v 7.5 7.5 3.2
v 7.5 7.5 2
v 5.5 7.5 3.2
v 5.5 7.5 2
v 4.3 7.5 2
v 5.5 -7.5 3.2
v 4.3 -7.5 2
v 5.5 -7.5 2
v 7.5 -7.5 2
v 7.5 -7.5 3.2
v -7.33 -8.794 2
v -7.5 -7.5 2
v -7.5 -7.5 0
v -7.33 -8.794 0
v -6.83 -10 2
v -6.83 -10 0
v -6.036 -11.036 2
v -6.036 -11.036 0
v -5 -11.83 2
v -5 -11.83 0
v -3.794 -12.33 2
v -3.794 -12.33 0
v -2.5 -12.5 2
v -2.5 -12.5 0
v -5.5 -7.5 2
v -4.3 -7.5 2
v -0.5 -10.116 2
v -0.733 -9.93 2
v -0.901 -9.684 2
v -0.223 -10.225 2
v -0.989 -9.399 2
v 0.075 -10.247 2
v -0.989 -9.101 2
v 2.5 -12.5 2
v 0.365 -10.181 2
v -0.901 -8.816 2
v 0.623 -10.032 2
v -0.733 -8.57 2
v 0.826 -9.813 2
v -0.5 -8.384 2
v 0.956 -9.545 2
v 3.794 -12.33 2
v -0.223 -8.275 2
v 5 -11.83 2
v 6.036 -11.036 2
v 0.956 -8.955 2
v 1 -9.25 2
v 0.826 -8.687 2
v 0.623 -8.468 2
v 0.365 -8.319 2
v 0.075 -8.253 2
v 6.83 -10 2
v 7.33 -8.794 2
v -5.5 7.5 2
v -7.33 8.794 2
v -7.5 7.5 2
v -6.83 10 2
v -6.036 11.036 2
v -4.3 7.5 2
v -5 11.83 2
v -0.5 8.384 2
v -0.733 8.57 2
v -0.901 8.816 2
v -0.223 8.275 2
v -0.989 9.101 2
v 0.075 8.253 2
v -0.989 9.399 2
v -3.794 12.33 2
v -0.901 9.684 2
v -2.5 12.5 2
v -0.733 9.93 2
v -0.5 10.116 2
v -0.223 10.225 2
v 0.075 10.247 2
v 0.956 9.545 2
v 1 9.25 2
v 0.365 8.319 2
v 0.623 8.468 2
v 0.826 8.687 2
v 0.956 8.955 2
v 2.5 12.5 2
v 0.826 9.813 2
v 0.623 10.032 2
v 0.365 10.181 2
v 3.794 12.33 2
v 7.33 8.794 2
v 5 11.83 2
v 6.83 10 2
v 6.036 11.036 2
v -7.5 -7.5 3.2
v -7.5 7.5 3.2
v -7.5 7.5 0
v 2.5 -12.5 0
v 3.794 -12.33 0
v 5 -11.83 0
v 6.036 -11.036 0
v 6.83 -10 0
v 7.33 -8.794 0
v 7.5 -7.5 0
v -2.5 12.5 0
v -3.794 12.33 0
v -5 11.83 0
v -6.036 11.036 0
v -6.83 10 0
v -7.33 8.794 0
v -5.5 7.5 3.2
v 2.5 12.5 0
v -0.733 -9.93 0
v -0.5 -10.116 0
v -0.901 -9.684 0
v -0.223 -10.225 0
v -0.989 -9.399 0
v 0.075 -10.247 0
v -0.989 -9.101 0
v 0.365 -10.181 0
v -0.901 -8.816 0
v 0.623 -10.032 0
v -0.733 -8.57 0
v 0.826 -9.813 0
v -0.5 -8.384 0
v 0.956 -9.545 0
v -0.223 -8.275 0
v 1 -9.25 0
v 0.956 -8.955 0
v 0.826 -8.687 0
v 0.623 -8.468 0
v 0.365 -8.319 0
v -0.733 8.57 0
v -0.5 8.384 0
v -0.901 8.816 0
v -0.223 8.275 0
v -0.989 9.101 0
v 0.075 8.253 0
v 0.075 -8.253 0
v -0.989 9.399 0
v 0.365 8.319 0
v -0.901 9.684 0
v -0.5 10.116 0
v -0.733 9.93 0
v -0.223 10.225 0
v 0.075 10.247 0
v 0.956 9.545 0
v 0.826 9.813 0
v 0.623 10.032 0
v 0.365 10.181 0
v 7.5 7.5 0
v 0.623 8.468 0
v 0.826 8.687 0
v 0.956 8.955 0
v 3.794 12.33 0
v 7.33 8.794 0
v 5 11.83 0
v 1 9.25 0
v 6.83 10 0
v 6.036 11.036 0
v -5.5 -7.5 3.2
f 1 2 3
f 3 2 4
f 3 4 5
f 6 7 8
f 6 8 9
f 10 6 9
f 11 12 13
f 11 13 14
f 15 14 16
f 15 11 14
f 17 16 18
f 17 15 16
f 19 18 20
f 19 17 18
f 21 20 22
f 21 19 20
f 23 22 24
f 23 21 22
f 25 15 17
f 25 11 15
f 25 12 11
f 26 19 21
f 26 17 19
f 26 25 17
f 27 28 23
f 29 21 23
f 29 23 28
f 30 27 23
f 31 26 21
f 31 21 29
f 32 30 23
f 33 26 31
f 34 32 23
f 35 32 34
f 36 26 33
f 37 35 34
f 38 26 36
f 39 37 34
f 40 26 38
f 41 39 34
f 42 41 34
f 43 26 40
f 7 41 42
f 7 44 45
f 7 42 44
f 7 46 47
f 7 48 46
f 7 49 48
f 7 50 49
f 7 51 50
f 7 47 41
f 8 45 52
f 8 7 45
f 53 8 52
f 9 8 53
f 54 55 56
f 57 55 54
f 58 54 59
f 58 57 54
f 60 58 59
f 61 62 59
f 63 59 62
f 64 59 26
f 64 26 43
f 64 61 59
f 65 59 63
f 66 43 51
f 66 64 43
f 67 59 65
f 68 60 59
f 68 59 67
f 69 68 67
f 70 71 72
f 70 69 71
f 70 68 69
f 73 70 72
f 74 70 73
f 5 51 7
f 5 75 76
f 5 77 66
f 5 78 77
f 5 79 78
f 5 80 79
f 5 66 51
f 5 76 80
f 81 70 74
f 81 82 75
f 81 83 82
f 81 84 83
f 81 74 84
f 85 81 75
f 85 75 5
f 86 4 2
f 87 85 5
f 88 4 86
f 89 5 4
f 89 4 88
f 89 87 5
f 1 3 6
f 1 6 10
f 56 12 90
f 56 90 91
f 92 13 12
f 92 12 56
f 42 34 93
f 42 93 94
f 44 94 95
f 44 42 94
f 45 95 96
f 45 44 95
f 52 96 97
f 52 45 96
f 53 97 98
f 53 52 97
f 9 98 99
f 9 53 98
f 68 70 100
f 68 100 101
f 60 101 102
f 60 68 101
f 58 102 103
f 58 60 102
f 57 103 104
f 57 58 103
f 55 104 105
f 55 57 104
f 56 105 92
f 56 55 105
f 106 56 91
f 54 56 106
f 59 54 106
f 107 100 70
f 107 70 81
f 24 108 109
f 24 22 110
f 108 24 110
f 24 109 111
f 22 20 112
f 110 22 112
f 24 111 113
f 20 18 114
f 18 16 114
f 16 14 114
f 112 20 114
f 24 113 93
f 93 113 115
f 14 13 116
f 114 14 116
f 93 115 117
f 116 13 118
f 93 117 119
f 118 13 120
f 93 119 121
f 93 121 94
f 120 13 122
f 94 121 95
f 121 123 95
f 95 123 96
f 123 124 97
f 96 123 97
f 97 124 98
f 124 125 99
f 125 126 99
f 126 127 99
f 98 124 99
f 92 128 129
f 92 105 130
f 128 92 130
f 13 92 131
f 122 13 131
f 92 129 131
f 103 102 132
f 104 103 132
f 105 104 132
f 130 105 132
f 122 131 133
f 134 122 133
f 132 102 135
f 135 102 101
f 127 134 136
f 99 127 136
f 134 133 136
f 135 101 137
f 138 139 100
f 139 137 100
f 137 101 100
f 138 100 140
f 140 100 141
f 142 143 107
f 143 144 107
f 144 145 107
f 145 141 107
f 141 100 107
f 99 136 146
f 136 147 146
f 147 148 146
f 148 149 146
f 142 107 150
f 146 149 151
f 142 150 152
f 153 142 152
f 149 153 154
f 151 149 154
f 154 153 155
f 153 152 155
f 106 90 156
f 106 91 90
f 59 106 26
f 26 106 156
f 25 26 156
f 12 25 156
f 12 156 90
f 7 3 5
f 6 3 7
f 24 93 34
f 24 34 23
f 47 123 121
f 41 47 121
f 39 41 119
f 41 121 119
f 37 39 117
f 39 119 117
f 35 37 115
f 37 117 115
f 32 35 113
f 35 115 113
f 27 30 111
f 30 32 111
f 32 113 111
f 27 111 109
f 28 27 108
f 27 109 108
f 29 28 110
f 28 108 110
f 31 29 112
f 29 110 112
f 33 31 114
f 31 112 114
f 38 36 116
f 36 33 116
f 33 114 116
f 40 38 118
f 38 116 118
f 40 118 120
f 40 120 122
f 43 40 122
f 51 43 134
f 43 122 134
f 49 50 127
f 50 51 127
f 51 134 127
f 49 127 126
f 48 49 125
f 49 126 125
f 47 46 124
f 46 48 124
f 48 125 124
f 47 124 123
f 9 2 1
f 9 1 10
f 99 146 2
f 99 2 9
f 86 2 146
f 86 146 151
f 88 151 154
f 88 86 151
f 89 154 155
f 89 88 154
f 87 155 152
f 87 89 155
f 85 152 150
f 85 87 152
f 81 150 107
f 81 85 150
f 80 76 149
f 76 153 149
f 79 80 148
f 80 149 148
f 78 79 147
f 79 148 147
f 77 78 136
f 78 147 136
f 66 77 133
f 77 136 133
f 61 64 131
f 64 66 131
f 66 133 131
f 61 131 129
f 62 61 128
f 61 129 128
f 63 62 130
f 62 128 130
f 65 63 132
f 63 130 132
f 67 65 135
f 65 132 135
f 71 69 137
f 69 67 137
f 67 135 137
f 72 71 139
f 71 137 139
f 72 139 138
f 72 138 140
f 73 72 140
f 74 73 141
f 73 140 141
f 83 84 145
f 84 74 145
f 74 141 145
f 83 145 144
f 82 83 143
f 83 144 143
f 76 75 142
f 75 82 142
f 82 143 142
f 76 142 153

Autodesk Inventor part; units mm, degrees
ref_plane "YZ Plane" through (0, 0, 0) normal (1, 0, 0) x (0, 1, 0)
ref_plane "XZ Plane" through (0, 0, 0) normal (0, 1, 0) x (-1, 0, 0)
ref_plane "XY Plane" through (0, 0, 0) normal (0, 0, 1) x (1, 0, 0)
sketch "Эскиз1" plane through (0, 0, 0) normal (0, 0, 1) x (1, 0, 0)
  circle A0 centre (0, 0) radius 6
  line L0 (-7.5, 12.5) -> (7.5, 12.5)
  line L1 (7.5, 12.5) -> (7.5, -12.5)
  line L2 (7.5, -12.5) -> (-7.5, -12.5)
  line L3 (-7.5, -12.5) -> (-7.5, 12.5)
  line L4 (-7.5, 12.5) -> (7.5, -12.5) construction
  line L5 (7.5, 12.5) -> (-7.5, -12.5) construction
  line L6 (0, 6) -> (0, 12.5)
  line L7 (0, -6) -> (0, -12.5)
  circle A1 centre (0, 9.25) radius 1
  circle A2 centre (0, -9.25) radius 1
  dimension "d0" = 12
  dimension "d1" = 15
  dimension "d2" = 25
  dimension "d31" = 2
  dimension "d32" = 2
extrude "Выдавливание1" add sketch "Эскиз1" along normal blind 2 contours A0 | A0 L6 A1 L0 L1 L2 L7 A2 | A0 L7 A2 L2 L3 L0 L6 A1
fillet "Сопряжение6" radius 5 4 edges at (-7.5, -12.5, 1) (-7.5, 12.5, 1) (7.5, 12.5, 1) (7.5, -12.5, 1)
sketch "Эскиз7" plane through (0, 0, 2) normal (0, 0, 1) x (1, 0, 0)
  circle A0 centre (0, 0) radius 4
  circle A1 centre (0, 0) radius 6
  line L0 (-7.5, 7.5) -> (-7.5, -7.5) projected
  line L1 (-7.5, 7.5) -> (-5.5, 7.5)
  line L2 (-5.5, 7.5) -> (-5.5, -7.5)
  line L3 (-5.5, -7.5) -> (-7.5, -7.5)
  line L4 (-7.5, -7.5) -> (-7.5, 7.5)
  arc A2 (7.5, 7.5) -> (2.5, 12.5) centre (2.5, 7.5) ccw projected
  line L5 (7.5, 7.5) -> (5.5, 7.5)
  line L6 (5.5, 7.5) -> (5.5, -7.5)
  line L7 (5.5, -7.5) -> (7.5, -7.5)
  line L8 (7.5, -7.5) -> (7.5, 7.5)
  dimension "d34" = 8
  dimension "d35" = 12
  dimension "d36" = 2
  dimension "d37" = 2
extrude "Выдавливание7" add sketch "Эскиз7" along normal blind 1.2 contours A1 L6 | A1 L6 L5 L8 L7 | L2 A1 | A1 L2 L3 L0 L1
chamfer "Фаска1" distance 1.2 angle 45 2 edges at (5.5, 0, 2) (-5.5, 0, 2)
properties part number "led_cap"
